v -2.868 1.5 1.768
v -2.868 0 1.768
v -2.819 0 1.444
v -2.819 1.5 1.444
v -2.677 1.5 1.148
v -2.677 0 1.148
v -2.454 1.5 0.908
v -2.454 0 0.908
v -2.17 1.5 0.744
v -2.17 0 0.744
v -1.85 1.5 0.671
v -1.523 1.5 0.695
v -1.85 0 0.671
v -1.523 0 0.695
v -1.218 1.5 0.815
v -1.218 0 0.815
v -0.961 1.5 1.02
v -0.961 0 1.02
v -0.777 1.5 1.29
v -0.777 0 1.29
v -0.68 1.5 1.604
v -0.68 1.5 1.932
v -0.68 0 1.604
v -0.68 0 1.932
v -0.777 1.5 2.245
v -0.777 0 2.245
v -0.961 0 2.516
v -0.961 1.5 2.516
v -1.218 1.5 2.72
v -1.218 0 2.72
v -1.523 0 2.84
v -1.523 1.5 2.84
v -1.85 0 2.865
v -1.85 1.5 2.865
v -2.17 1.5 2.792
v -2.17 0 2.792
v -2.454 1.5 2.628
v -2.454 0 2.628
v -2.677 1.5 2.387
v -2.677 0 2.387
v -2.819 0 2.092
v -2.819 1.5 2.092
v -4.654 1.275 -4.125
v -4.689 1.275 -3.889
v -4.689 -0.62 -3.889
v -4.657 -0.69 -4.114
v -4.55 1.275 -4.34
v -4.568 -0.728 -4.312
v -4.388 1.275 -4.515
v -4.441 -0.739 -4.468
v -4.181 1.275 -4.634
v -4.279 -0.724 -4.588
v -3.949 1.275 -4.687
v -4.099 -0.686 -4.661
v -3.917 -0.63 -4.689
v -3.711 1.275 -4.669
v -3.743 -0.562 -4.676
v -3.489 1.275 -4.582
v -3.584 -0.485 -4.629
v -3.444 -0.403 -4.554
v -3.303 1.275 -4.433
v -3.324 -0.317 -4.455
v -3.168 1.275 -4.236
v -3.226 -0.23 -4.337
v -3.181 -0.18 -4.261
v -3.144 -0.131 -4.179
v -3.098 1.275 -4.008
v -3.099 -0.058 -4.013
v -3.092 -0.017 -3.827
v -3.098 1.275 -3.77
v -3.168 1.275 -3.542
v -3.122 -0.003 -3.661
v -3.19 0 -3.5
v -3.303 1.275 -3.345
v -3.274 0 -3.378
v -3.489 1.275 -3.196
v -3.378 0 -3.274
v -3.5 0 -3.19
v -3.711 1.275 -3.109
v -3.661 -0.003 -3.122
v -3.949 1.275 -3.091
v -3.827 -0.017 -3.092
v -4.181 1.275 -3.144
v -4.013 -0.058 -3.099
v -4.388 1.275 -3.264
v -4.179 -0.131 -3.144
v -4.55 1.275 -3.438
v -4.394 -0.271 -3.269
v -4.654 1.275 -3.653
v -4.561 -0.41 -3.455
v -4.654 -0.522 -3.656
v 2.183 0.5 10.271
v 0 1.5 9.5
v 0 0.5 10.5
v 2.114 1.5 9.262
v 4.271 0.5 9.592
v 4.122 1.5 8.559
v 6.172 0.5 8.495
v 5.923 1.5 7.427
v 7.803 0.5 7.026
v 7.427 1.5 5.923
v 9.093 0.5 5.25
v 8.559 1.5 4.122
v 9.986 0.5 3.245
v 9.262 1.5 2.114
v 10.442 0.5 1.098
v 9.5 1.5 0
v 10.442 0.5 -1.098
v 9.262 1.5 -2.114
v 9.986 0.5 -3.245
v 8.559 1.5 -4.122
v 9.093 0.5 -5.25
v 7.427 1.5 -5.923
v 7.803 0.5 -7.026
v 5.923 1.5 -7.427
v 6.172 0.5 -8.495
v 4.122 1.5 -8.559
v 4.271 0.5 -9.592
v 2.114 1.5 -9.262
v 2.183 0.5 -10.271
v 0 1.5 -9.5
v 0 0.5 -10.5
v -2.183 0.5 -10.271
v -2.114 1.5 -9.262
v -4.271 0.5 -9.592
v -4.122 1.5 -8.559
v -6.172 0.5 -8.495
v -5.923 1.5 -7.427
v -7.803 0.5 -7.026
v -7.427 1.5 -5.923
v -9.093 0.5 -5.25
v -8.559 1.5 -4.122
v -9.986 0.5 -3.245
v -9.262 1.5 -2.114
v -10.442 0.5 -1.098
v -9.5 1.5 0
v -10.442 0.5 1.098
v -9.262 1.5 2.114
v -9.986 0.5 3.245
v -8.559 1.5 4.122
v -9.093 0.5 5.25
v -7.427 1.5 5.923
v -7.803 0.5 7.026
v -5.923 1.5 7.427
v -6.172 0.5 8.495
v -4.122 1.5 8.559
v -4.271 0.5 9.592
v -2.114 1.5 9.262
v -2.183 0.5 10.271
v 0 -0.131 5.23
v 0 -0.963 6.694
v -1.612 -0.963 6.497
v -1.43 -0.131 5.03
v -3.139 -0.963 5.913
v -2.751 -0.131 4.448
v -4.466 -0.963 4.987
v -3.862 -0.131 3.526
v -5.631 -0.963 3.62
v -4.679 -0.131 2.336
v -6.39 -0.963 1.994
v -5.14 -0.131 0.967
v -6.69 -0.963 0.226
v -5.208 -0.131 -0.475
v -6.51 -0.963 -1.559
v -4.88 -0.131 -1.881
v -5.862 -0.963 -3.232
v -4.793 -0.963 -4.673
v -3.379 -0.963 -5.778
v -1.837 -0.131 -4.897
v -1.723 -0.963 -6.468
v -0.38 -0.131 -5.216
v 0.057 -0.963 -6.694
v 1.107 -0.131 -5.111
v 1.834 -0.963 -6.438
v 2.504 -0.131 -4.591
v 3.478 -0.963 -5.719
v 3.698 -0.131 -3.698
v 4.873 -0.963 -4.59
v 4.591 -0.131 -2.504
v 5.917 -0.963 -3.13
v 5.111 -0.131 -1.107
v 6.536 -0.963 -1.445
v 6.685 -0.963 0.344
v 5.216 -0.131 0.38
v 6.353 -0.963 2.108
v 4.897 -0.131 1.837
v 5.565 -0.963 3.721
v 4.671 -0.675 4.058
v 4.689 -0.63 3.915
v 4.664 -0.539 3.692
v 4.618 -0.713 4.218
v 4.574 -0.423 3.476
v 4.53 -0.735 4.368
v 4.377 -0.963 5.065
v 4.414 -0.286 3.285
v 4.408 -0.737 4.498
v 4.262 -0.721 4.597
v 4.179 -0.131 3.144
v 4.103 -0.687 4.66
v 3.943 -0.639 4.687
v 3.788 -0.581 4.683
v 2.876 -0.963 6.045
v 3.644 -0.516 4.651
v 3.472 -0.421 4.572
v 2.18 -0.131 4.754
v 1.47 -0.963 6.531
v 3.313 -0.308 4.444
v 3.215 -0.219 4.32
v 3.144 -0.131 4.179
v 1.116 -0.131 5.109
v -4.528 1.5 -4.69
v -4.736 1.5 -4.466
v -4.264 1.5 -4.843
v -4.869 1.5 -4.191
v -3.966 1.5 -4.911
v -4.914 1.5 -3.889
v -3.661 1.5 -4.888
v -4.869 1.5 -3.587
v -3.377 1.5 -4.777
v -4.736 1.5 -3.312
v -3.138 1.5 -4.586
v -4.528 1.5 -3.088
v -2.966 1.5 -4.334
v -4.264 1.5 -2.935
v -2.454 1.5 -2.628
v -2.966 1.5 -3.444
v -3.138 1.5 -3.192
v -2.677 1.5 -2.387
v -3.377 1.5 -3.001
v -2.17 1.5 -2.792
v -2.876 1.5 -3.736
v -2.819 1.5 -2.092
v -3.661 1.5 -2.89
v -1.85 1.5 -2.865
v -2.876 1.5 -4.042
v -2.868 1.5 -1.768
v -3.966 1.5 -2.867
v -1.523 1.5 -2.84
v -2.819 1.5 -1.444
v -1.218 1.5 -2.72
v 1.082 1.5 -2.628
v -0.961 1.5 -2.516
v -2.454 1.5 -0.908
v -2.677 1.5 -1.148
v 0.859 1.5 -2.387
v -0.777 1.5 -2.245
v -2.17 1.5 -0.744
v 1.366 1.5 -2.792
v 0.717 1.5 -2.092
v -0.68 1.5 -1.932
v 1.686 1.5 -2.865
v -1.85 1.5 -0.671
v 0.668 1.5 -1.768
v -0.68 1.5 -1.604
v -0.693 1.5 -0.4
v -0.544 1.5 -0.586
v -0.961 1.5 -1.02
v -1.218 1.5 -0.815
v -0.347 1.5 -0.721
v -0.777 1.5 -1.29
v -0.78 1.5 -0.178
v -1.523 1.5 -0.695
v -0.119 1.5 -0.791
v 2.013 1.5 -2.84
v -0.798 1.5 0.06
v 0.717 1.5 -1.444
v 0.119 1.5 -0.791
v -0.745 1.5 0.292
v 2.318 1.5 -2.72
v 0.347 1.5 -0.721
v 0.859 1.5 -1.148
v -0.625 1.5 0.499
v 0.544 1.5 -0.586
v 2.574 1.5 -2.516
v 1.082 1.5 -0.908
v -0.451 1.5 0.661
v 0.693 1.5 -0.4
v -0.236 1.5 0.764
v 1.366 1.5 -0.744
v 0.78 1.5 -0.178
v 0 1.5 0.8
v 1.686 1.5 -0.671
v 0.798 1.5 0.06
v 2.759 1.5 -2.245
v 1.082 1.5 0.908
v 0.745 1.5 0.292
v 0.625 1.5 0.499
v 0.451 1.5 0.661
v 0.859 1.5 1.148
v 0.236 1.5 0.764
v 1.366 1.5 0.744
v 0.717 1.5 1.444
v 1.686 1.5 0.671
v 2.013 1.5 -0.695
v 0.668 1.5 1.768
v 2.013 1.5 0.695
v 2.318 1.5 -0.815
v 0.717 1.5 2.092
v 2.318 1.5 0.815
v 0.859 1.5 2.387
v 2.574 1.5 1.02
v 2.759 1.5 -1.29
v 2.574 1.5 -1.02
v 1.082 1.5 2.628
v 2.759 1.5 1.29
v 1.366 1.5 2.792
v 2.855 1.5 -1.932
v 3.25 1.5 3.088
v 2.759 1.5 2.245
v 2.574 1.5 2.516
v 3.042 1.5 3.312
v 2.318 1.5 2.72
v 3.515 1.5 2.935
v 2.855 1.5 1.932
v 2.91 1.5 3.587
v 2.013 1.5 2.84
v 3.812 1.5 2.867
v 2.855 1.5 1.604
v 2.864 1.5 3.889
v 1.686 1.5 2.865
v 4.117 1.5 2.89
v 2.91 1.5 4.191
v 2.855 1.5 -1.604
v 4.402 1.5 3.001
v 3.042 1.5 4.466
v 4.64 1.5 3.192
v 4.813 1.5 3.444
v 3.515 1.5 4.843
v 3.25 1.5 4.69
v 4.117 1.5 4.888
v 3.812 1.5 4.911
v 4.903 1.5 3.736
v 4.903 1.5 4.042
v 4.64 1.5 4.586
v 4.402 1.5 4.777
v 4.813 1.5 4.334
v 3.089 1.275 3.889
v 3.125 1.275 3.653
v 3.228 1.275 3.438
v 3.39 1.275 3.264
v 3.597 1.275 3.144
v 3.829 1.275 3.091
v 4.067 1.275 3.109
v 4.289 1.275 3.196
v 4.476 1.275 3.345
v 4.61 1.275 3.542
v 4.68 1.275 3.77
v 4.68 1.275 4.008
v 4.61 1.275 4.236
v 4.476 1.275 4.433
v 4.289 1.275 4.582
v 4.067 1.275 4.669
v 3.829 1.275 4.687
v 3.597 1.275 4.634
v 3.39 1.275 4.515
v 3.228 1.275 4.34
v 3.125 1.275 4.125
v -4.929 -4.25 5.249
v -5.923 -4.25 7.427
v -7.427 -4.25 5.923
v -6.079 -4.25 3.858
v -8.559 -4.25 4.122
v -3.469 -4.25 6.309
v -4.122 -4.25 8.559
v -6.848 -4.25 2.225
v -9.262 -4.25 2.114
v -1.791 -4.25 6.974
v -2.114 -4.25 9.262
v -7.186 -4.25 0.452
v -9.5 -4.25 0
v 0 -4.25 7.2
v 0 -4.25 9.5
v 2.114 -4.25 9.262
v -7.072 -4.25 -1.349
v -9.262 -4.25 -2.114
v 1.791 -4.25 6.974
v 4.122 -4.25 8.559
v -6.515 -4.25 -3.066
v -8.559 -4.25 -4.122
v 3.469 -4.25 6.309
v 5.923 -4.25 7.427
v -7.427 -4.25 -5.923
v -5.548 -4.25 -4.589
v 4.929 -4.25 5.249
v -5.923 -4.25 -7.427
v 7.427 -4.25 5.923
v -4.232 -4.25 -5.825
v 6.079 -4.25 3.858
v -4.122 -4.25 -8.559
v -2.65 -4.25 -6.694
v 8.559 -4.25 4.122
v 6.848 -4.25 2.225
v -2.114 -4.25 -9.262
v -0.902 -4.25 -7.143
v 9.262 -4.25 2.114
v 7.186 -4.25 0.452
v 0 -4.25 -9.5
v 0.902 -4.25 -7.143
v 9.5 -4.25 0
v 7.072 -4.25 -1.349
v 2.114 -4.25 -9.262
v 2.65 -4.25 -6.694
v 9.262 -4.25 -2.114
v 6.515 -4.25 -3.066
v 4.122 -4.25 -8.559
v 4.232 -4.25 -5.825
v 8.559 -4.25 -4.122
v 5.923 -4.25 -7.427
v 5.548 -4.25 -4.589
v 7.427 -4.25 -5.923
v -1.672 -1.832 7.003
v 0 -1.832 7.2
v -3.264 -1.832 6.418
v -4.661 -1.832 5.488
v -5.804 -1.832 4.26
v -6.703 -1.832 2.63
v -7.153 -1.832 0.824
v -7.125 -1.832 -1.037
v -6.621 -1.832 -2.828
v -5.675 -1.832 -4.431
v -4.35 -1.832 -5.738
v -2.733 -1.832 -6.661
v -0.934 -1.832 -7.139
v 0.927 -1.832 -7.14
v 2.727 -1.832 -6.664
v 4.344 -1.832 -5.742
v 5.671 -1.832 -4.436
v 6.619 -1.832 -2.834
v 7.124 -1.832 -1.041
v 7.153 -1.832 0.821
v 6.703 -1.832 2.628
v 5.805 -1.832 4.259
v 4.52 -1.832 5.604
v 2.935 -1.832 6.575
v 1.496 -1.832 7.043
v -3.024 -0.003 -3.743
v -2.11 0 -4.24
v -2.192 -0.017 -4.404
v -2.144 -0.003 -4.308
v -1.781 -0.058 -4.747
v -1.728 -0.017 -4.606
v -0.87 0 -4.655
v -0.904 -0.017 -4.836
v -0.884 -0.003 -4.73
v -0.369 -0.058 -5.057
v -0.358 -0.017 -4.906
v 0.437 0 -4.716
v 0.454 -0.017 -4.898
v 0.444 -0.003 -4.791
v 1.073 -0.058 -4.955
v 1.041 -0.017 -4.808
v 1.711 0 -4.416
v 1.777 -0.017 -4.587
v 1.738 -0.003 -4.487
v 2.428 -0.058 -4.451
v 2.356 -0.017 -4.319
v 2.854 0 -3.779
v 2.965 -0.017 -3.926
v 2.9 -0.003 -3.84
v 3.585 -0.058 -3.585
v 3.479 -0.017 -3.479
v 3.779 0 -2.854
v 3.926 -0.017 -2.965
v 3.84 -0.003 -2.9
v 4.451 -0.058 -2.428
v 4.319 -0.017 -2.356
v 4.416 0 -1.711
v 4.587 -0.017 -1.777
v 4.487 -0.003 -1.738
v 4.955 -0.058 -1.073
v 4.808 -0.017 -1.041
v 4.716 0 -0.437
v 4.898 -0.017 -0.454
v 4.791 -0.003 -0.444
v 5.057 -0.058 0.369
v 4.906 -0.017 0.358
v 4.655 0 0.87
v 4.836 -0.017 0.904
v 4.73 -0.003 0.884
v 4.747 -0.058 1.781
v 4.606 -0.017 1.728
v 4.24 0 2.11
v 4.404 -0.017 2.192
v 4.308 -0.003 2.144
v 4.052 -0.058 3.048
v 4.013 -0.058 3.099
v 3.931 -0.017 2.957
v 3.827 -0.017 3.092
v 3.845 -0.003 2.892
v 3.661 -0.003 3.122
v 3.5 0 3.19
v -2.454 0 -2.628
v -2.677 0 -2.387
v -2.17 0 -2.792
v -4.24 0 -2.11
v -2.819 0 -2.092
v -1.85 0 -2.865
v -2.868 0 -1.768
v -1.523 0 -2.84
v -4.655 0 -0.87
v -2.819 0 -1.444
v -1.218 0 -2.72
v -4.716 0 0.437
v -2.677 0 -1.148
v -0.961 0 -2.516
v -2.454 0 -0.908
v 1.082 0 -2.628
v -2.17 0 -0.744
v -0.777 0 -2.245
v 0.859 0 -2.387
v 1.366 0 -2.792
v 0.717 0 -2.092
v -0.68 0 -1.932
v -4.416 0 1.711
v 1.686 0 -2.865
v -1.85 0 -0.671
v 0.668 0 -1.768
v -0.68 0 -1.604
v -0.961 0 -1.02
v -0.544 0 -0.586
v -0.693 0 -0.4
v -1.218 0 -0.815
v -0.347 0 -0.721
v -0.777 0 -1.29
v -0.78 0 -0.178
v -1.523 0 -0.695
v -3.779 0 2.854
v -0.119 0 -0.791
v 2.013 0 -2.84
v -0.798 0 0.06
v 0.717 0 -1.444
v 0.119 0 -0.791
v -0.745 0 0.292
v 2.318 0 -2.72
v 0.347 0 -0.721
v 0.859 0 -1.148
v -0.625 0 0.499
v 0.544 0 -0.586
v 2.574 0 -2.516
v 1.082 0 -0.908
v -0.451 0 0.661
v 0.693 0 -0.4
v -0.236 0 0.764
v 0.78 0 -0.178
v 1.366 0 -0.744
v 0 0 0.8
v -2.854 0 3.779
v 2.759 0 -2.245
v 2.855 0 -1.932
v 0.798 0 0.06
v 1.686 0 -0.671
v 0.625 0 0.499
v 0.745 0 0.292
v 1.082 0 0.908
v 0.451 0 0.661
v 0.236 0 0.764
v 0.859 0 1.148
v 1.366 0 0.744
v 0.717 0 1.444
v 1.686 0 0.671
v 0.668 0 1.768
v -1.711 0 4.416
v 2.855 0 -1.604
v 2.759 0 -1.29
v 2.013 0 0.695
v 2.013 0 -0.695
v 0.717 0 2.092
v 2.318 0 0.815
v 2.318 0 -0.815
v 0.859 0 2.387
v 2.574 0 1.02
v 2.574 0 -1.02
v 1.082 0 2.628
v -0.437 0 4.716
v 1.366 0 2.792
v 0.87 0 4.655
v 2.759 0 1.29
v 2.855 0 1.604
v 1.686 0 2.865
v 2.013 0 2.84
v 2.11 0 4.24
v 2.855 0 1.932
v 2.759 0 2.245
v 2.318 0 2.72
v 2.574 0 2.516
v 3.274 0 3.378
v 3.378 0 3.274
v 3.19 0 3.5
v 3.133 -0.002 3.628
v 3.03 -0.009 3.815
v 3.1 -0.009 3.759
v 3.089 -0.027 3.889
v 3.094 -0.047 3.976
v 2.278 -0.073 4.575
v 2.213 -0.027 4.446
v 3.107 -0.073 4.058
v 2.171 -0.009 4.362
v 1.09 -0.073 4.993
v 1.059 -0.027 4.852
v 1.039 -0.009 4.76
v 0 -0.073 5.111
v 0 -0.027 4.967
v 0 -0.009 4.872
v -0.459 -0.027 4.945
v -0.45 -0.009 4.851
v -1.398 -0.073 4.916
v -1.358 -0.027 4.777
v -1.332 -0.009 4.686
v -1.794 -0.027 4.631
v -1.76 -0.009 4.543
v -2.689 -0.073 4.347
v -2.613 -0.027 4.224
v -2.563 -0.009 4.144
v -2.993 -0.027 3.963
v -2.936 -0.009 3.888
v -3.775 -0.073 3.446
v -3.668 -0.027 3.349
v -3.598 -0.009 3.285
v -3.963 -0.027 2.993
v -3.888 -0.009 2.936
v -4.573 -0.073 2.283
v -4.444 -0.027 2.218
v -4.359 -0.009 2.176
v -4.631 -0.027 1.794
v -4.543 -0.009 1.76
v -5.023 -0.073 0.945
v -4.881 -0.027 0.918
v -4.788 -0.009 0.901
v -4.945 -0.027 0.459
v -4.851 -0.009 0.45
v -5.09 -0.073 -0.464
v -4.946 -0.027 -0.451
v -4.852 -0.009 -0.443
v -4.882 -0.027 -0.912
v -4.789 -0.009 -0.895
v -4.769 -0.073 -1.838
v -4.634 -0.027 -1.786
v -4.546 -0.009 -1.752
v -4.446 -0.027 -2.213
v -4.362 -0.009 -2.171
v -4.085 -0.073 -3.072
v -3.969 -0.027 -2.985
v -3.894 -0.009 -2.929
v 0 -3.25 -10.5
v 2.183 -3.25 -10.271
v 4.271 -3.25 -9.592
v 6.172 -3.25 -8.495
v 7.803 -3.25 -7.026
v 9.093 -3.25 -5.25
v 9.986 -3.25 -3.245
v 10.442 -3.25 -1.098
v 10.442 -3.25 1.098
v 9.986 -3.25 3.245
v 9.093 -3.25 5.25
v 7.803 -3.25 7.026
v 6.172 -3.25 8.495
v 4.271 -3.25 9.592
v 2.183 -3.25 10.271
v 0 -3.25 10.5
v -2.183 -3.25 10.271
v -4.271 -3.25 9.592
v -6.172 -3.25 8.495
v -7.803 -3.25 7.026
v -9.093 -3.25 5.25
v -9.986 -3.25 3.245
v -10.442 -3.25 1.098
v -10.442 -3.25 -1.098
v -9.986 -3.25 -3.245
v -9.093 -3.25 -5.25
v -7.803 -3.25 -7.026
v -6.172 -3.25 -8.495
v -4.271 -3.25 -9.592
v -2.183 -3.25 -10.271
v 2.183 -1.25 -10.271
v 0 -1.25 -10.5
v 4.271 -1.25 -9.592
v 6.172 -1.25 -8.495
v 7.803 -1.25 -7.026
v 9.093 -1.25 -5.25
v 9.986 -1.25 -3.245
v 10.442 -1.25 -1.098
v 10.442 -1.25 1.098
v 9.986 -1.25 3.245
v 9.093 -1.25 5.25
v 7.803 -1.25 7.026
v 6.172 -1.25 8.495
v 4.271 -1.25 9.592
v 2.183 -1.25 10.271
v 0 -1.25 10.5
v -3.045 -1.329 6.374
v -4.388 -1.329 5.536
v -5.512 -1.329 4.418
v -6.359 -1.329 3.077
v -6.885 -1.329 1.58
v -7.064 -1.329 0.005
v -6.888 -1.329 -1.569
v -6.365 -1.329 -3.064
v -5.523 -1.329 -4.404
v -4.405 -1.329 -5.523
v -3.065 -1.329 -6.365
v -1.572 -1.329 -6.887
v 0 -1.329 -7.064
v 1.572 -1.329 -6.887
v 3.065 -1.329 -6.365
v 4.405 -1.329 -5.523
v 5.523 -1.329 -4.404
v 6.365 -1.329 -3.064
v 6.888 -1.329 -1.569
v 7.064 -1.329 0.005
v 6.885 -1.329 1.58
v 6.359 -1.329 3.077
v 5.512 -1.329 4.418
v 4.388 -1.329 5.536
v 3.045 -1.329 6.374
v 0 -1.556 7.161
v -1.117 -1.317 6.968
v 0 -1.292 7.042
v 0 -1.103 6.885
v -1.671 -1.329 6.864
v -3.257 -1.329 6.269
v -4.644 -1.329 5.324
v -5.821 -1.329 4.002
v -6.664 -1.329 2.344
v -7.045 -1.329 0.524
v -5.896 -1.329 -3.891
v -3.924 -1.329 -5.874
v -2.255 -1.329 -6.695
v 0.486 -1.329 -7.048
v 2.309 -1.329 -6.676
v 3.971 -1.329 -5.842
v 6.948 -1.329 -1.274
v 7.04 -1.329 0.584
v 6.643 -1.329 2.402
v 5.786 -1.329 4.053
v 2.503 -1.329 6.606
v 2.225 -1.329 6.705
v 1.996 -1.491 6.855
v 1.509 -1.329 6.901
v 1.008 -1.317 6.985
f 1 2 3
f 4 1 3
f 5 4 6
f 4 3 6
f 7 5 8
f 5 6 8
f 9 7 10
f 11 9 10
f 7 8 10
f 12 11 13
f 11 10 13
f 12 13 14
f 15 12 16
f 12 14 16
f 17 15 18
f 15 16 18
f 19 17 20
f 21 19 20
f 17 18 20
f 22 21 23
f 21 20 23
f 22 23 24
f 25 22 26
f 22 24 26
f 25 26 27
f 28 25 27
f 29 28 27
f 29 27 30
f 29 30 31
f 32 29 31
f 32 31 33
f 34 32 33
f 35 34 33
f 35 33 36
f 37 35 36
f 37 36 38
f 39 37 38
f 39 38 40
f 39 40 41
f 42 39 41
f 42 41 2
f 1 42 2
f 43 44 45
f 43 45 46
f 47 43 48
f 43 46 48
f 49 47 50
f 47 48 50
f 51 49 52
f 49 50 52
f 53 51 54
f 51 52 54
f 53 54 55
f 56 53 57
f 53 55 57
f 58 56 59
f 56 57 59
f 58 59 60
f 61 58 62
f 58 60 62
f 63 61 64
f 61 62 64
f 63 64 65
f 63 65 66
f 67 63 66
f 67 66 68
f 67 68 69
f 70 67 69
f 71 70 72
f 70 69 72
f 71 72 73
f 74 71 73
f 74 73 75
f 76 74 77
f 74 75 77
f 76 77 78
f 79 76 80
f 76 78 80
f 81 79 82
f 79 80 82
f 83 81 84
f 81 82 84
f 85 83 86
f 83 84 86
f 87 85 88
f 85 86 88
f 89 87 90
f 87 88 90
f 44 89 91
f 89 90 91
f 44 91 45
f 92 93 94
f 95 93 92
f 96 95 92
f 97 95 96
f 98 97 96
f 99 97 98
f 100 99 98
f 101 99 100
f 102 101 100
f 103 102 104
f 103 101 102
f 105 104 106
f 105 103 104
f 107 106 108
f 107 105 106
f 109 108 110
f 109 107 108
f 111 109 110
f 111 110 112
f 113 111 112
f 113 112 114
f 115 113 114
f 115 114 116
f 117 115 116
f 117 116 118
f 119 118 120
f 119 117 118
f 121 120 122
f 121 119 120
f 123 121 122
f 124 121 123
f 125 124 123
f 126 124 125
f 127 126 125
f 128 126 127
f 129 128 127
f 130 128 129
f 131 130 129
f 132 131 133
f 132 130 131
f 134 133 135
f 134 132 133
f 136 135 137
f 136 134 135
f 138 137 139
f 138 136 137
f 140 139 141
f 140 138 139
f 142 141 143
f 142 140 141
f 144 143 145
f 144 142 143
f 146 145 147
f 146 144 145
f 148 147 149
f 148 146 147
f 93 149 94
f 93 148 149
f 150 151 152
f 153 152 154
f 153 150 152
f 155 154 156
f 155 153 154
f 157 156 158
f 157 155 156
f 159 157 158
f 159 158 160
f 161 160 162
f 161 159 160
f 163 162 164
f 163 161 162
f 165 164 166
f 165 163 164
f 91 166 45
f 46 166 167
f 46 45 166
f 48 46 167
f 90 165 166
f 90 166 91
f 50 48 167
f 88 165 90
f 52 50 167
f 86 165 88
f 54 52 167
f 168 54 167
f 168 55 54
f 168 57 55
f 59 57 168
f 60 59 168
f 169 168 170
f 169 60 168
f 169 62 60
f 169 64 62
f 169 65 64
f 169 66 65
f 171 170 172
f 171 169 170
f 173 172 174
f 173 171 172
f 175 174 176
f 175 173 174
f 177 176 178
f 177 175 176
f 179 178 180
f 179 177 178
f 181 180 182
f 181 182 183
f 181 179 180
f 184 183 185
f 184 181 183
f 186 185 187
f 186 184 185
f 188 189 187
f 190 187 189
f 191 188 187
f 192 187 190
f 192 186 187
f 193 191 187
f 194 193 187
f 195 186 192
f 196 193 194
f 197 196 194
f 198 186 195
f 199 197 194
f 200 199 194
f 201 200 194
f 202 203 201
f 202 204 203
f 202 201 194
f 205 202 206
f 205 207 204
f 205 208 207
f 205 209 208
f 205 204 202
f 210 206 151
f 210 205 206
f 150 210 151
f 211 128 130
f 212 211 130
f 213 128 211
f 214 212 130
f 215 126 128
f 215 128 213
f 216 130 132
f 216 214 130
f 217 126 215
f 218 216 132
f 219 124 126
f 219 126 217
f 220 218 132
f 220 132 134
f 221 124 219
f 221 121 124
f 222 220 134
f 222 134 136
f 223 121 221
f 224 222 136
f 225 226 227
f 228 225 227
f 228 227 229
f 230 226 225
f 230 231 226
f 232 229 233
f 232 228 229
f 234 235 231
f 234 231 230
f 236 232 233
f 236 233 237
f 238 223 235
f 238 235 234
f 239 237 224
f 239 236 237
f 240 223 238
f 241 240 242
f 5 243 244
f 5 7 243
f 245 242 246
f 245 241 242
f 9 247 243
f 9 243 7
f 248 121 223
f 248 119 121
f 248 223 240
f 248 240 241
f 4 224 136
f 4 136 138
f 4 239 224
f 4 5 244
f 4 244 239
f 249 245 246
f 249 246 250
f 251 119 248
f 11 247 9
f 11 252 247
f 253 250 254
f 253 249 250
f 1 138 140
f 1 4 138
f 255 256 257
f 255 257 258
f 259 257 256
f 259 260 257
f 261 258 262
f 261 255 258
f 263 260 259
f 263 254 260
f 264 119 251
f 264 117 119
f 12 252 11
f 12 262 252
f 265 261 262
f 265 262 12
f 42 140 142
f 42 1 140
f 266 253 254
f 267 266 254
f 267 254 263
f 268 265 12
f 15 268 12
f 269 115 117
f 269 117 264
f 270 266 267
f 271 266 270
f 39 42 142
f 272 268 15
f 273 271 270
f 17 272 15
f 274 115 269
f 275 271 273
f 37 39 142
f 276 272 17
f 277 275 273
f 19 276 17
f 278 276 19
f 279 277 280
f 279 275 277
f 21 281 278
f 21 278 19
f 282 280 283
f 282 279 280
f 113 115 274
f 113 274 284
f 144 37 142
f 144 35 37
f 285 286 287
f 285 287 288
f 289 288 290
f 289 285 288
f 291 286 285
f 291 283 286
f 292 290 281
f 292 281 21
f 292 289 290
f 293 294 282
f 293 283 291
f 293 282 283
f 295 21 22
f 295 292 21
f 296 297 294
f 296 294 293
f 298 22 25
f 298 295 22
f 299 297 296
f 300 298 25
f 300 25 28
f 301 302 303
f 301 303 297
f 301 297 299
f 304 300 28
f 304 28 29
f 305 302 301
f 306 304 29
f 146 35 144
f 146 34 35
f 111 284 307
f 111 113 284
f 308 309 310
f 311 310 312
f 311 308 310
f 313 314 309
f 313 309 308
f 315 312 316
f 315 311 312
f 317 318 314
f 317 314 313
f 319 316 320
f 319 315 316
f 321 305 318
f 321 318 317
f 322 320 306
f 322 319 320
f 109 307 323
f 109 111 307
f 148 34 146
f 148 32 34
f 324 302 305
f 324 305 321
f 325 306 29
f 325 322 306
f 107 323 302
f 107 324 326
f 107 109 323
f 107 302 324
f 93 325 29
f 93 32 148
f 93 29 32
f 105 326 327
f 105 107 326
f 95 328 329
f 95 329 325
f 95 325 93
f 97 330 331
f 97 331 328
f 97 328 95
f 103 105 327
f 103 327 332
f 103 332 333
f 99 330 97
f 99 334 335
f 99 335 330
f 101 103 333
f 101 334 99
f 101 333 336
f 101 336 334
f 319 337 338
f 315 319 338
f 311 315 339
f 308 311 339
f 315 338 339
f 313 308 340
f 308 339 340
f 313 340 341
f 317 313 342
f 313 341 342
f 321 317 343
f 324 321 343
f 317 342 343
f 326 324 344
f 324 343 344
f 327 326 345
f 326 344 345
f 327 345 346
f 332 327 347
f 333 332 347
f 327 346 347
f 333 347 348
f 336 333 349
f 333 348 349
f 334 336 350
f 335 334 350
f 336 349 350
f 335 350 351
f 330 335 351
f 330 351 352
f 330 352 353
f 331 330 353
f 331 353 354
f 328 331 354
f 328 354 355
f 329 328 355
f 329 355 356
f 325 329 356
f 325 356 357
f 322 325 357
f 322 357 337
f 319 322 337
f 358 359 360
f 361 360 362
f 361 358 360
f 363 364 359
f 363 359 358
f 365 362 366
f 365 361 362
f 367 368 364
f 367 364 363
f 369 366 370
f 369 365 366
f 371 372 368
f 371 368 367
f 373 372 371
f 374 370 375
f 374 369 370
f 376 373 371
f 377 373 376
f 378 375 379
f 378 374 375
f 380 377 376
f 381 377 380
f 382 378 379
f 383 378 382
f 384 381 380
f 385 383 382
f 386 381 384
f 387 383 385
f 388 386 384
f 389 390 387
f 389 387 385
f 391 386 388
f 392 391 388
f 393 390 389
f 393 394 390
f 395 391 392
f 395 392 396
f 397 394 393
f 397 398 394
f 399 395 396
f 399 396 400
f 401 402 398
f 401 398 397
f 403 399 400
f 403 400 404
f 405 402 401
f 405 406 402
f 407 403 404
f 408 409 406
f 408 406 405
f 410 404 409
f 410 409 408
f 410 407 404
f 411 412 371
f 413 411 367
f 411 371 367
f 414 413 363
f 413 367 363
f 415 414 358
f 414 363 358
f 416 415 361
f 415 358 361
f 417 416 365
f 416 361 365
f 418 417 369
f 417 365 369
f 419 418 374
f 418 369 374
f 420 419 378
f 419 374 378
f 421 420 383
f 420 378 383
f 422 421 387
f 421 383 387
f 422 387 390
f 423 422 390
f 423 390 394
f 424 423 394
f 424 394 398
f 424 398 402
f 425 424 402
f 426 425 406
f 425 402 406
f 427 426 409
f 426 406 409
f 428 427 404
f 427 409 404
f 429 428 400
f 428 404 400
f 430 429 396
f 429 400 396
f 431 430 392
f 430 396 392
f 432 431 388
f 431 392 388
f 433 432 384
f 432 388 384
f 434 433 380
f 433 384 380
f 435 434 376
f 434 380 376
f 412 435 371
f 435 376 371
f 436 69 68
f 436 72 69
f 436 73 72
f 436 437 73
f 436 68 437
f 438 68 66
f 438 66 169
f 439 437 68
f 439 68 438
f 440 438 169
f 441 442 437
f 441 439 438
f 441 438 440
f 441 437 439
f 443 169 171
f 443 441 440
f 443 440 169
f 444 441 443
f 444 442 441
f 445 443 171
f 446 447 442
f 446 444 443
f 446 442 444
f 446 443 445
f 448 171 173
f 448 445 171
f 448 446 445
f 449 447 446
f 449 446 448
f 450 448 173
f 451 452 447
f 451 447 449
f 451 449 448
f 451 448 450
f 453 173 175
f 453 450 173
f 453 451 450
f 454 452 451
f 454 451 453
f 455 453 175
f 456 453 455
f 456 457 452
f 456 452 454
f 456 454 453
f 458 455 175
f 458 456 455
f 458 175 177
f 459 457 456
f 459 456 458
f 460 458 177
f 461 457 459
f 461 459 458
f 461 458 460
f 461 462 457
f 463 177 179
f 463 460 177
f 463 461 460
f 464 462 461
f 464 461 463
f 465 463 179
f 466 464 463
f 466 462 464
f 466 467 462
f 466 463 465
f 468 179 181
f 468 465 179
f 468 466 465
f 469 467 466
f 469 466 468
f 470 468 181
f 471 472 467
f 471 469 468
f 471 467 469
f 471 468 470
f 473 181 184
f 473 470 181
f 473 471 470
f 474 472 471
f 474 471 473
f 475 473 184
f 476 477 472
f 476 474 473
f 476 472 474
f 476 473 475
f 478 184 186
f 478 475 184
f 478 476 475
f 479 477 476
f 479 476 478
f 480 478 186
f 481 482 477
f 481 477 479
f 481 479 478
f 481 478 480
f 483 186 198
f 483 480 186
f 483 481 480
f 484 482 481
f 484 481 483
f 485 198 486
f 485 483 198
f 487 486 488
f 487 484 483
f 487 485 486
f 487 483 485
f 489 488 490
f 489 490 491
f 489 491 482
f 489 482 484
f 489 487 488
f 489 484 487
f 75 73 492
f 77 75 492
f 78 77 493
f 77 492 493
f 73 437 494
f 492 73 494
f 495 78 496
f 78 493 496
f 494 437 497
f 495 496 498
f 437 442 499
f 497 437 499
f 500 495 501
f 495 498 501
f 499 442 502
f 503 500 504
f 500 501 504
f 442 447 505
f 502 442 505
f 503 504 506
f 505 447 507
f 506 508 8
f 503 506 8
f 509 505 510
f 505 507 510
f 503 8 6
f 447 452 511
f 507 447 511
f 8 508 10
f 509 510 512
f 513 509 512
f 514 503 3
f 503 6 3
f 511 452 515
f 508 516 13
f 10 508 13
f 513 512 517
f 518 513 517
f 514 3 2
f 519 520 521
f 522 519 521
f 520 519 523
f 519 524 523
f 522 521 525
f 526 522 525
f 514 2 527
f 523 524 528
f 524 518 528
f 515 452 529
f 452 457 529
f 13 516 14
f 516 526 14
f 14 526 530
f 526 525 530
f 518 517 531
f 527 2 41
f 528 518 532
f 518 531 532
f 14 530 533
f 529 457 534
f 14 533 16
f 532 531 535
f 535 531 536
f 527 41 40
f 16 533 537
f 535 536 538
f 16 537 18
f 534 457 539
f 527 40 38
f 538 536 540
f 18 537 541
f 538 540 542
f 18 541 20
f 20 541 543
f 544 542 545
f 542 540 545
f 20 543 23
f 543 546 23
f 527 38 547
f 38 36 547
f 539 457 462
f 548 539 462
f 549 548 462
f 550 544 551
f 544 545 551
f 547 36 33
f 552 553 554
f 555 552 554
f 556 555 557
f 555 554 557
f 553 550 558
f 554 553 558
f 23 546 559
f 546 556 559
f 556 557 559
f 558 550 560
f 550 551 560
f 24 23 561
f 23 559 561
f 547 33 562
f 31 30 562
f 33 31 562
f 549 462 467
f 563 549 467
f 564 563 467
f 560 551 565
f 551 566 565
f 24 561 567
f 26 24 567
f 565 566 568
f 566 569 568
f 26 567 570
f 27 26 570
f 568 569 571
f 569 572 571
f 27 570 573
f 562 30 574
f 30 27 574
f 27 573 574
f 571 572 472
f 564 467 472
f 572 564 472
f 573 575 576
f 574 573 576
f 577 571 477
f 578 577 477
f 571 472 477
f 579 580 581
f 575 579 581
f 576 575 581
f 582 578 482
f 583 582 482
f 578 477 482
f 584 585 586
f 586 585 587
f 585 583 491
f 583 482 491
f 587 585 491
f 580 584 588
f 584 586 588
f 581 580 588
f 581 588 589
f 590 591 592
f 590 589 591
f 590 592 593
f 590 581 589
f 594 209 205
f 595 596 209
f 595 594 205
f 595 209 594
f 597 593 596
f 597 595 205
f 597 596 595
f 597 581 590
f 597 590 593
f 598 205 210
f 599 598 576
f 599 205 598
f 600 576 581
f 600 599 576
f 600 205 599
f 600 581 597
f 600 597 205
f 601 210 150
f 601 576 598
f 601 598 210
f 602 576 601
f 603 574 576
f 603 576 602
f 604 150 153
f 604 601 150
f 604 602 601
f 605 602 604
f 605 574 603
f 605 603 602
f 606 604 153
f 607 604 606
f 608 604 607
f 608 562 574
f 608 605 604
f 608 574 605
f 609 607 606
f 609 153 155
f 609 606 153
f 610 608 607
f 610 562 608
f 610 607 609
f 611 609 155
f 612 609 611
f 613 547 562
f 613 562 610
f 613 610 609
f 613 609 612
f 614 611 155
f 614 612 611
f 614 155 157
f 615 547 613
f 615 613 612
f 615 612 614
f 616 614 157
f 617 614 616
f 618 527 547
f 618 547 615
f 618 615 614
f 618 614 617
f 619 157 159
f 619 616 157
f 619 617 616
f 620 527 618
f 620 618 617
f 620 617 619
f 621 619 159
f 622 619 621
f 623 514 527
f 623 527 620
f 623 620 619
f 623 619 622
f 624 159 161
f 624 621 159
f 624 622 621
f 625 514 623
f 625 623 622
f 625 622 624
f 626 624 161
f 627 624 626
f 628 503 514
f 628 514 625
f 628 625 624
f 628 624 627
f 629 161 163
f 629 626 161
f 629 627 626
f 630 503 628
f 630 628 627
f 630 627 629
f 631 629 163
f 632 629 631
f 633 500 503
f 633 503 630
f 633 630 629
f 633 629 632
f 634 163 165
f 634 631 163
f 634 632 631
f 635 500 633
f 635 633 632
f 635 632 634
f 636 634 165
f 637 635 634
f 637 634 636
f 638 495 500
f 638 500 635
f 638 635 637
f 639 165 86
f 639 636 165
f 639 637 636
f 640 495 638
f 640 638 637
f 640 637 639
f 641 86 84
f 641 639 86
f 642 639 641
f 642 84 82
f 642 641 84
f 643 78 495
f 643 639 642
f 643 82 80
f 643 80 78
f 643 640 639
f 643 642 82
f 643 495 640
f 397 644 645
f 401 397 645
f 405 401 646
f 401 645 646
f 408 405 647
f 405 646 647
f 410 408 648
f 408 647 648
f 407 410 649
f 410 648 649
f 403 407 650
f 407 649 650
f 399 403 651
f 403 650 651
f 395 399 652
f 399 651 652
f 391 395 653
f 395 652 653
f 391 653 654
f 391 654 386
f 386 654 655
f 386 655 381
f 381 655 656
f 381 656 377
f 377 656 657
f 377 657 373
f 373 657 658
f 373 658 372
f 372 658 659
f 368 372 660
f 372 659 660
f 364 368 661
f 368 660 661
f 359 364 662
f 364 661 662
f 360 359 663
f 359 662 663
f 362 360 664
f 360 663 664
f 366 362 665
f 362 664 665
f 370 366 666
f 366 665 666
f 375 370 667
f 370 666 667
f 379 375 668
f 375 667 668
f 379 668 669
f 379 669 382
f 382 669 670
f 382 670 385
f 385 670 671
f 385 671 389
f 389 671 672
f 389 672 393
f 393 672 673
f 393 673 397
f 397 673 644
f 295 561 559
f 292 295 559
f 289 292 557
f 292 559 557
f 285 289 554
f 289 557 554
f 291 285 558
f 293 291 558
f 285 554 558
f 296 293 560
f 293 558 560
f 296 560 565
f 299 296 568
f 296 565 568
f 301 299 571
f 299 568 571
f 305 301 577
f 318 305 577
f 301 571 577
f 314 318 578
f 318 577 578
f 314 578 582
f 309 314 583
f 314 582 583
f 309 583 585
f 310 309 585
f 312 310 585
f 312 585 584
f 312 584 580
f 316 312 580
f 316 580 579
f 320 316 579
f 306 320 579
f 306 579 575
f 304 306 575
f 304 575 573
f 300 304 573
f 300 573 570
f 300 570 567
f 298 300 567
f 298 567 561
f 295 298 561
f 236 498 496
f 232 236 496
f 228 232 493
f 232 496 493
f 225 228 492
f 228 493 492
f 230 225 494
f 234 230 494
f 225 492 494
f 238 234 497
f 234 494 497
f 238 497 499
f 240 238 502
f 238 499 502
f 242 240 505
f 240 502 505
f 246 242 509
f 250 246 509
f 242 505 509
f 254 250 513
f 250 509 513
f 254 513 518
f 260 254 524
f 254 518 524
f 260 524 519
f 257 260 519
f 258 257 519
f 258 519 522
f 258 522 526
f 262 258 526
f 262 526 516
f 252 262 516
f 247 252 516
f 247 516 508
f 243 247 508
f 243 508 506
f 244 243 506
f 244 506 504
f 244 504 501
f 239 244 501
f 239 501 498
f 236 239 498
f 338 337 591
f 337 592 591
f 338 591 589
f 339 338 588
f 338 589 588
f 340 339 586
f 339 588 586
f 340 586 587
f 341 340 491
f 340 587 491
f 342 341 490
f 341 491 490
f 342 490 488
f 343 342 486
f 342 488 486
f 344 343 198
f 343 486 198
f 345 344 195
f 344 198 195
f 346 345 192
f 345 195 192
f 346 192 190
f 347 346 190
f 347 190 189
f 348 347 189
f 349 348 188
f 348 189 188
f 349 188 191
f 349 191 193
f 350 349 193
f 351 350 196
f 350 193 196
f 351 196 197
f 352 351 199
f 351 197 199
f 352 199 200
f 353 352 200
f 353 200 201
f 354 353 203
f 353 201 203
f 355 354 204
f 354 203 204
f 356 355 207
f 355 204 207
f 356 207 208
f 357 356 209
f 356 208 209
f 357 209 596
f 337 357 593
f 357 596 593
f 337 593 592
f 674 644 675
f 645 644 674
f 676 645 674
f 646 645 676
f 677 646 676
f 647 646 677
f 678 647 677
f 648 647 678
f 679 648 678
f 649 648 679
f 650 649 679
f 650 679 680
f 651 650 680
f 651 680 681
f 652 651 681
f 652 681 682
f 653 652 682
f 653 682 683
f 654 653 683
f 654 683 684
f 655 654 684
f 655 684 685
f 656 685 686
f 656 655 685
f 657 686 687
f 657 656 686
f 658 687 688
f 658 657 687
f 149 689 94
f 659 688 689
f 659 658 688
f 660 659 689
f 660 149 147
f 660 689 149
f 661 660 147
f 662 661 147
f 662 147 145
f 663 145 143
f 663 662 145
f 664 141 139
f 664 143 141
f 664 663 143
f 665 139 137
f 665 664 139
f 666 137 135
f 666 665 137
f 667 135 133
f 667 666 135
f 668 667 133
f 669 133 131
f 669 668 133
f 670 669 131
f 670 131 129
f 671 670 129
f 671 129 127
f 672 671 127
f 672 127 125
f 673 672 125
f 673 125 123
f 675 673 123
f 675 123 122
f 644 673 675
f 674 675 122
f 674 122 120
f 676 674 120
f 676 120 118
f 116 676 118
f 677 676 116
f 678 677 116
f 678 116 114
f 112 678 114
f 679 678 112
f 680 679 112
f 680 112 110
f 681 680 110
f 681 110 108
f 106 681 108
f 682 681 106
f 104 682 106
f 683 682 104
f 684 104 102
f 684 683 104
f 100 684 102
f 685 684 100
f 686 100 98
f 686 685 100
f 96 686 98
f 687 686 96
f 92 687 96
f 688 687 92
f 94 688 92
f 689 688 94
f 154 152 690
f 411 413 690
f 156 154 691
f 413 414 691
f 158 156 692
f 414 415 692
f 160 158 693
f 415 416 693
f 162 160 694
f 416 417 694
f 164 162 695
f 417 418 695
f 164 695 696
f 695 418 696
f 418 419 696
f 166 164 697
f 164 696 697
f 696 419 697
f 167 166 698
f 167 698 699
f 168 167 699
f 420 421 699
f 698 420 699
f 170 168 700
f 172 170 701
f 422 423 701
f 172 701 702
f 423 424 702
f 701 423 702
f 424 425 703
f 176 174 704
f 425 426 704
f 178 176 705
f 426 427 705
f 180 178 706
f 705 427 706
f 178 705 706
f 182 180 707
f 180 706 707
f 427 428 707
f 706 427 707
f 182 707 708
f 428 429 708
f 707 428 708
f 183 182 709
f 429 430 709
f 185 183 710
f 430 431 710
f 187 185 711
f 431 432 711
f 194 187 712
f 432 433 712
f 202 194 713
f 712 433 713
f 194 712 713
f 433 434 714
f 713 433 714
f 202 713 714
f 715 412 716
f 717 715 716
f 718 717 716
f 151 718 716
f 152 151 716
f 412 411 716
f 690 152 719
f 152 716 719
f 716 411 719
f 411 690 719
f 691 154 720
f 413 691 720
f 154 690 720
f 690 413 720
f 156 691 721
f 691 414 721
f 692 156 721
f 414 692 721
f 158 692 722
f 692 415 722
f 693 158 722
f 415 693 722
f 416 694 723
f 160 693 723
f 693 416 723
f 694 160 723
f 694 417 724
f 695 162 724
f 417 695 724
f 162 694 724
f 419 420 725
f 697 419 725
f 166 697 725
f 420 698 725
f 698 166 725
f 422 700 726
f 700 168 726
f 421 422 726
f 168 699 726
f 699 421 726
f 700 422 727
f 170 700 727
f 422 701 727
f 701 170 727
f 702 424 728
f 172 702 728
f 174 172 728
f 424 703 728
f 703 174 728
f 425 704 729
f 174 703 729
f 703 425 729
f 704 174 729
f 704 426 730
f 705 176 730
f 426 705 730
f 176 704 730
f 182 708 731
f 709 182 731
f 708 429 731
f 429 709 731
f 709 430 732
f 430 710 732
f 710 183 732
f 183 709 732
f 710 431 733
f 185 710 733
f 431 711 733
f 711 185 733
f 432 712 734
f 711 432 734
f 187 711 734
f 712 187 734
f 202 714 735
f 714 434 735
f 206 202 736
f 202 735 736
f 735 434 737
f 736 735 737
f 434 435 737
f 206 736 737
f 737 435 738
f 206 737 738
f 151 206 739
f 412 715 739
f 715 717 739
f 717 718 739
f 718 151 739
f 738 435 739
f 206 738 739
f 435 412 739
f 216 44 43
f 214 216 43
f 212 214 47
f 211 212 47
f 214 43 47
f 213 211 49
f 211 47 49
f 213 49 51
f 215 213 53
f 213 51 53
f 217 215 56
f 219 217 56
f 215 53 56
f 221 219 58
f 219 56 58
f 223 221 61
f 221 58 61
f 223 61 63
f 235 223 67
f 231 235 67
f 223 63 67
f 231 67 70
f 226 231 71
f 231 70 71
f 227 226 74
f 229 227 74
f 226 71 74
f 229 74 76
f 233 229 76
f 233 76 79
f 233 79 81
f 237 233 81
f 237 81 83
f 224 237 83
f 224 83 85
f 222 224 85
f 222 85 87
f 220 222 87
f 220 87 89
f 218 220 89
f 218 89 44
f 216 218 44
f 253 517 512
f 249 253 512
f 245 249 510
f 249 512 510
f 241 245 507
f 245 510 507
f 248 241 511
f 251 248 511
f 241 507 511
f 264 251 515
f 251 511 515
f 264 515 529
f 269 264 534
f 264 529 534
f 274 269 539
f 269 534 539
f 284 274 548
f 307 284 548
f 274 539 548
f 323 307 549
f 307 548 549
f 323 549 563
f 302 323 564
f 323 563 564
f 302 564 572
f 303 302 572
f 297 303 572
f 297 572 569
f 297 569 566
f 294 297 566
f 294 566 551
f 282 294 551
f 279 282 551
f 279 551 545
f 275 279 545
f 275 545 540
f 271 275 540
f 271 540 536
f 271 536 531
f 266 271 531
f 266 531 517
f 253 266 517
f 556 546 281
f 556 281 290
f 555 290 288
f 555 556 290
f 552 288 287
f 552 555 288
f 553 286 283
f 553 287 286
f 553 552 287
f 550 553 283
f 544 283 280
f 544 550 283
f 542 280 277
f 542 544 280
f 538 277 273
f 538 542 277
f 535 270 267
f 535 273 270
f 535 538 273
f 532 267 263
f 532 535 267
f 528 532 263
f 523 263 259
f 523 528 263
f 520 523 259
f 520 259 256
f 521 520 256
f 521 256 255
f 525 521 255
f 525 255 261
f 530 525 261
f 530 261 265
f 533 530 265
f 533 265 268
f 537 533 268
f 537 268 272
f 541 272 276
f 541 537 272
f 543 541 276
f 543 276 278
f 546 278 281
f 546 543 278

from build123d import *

# Parameters (mm, degrees)
SKETCH1_R                       = 10.5
BOSS_EXTRUDE1_DEPTH             = 1.5
CUT_EXTRUDE1_DEPTH              = 15.924811557
CUT_EXTRUDE1_DEPTH_BACK         = 15.924811557
SKETCH2_R                       = 0.8
M2_CLEARANCE_HOLE1_D            = 2.2
M2_CLEARANCE_HOLE1_DEPTH        = 5
M2_CLEARANCE_HOLE1_TIP          = 0.660946681
BOSS_EXTRUDE2_START             = 3
SKETCH7_R                       = 10.5
SKETCH7_R_2                     = 7.2
BOSS_EXTRUDE2_DEPTH             = 3
FILLET1_R                       = 1
CHAMFER1_SIZE                   = 1
CHAMFER2_SIZE                   = 1
M2X0_4_TAPPED_HOLE1_D           = 1.6
M2X0_4_TAPPED_HOLE1_DEPTH       = 5.2
M2X0_4_TAPPED_HOLE1_CSINK_D     = 2.05
M2X0_4_TAPPED_HOLE1_CSINK_ANGLE = 90
M2X0_4_TAPPED_HOLE1_TIP         = 0.480688495


with BuildPart() as part:
    # Sketch1 → Boss-Extrude1 (new body)
    with BuildSketch(Plane(origin=(0, 0, 0), x_dir=(1, 0, 0), z_dir=(0, 1, 0))):
        Circle(SKETCH1_R)
    extrude(amount=BOSS_EXTRUDE1_DEPTH)

    # Sketch2 → Cut-Extrude1 (cut, two sides: drawn at the far end of the back side and taken through both)
    with BuildSketch(Plane(origin=(0, 1.5, 0), x_dir=(1, 0, 0), z_dir=(0, 1, 0)).offset(-CUT_EXTRUDE1_DEPTH_BACK)):
        Circle(SKETCH2_R)
    extrude(amount=CUT_EXTRUDE1_DEPTH + CUT_EXTRUDE1_DEPTH_BACK, mode=Mode.SUBTRACT)

    # M2 Clearance Hole1
    with Locations(Plane(origin=(0, 1.5, 0), x_dir=(1, 0, 0), z_dir=(0, 1, 0))):
        with Locations((-1.767766953, 1.767766953), (1.767766953, 1.767766953), (1.767766953, -1.767766953), (-1.767766953, -1.767766953)):
            Hole(M2_CLEARANCE_HOLE1_D / 2, depth=M2_CLEARANCE_HOLE1_DEPTH)
            with Locations((0, 0, -(M2_CLEARANCE_HOLE1_DEPTH + M2_CLEARANCE_HOLE1_TIP / 2))):  # 118° drill point
                Cone(0, M2_CLEARANCE_HOLE1_D / 2, M2_CLEARANCE_HOLE1_TIP, mode=Mode.SUBTRACT)

    # Sketch6 → Revolve1 (revolve)
    with BuildSketch(Plane.XY):
        Polygon((-10.5, 0), (-10.5, -1.25), (-7.2, -1.25), (-5, 0), align=None)
    revolve(axis=Axis((0, 0, 0), (0, -1, 0)))

    # Sketch7 → Boss-Extrude2 (add)
    with BuildSketch(Plane.XZ.offset(1.25).offset(BOSS_EXTRUDE2_START)):
        Circle(SKETCH7_R)
        Circle(SKETCH7_R_2, mode=Mode.SUBTRACT)
    extrude(amount=-BOSS_EXTRUDE2_DEPTH)

    # Fillet1
    fillet1_edges = [part.edges().sort_by_distance(p)[0] for p in [
        (5, 0, 0),
        (0, -1.25, 7.2),
    ]]
    fillet(fillet1_edges, radius=FILLET1_R)

    # Chamfer1
    chamfer1_edges = [part.edges().sort_by_distance(p)[0] for p in [
        (-10.5, 1.5, 0),
    ]]
    chamfer(chamfer1_edges, length=CHAMFER1_SIZE)

    # Chamfer2
    chamfer2_edges = [part.edges().sort_by_distance(p)[0] for p in [
        (-10.5, -4.25, 0),
    ]]
    chamfer(chamfer2_edges, length=CHAMFER2_SIZE)

    # M2x0.4 Tapped Hole1
    with Locations(Plane(origin=(0, 1.5, 0), x_dir=(1, 0, 0), z_dir=(0, 1, 0))):
        with Locations((-3.889087297, 3.889087297), (3.889087297, -3.889087297), (-1.767766953, 1.767766953)):
            CounterSinkHole(M2X0_4_TAPPED_HOLE1_D / 2, M2X0_4_TAPPED_HOLE1_CSINK_D / 2, depth=M2X0_4_TAPPED_HOLE1_DEPTH, counter_sink_angle=M2X0_4_TAPPED_HOLE1_CSINK_ANGLE)
            with Locations((0, 0, -(M2X0_4_TAPPED_HOLE1_DEPTH + M2X0_4_TAPPED_HOLE1_TIP / 2))):  # 118° drill point
                Cone(0, M2X0_4_TAPPED_HOLE1_D / 2, M2X0_4_TAPPED_HOLE1_TIP, mode=Mode.SUBTRACT)


solid = part.part
